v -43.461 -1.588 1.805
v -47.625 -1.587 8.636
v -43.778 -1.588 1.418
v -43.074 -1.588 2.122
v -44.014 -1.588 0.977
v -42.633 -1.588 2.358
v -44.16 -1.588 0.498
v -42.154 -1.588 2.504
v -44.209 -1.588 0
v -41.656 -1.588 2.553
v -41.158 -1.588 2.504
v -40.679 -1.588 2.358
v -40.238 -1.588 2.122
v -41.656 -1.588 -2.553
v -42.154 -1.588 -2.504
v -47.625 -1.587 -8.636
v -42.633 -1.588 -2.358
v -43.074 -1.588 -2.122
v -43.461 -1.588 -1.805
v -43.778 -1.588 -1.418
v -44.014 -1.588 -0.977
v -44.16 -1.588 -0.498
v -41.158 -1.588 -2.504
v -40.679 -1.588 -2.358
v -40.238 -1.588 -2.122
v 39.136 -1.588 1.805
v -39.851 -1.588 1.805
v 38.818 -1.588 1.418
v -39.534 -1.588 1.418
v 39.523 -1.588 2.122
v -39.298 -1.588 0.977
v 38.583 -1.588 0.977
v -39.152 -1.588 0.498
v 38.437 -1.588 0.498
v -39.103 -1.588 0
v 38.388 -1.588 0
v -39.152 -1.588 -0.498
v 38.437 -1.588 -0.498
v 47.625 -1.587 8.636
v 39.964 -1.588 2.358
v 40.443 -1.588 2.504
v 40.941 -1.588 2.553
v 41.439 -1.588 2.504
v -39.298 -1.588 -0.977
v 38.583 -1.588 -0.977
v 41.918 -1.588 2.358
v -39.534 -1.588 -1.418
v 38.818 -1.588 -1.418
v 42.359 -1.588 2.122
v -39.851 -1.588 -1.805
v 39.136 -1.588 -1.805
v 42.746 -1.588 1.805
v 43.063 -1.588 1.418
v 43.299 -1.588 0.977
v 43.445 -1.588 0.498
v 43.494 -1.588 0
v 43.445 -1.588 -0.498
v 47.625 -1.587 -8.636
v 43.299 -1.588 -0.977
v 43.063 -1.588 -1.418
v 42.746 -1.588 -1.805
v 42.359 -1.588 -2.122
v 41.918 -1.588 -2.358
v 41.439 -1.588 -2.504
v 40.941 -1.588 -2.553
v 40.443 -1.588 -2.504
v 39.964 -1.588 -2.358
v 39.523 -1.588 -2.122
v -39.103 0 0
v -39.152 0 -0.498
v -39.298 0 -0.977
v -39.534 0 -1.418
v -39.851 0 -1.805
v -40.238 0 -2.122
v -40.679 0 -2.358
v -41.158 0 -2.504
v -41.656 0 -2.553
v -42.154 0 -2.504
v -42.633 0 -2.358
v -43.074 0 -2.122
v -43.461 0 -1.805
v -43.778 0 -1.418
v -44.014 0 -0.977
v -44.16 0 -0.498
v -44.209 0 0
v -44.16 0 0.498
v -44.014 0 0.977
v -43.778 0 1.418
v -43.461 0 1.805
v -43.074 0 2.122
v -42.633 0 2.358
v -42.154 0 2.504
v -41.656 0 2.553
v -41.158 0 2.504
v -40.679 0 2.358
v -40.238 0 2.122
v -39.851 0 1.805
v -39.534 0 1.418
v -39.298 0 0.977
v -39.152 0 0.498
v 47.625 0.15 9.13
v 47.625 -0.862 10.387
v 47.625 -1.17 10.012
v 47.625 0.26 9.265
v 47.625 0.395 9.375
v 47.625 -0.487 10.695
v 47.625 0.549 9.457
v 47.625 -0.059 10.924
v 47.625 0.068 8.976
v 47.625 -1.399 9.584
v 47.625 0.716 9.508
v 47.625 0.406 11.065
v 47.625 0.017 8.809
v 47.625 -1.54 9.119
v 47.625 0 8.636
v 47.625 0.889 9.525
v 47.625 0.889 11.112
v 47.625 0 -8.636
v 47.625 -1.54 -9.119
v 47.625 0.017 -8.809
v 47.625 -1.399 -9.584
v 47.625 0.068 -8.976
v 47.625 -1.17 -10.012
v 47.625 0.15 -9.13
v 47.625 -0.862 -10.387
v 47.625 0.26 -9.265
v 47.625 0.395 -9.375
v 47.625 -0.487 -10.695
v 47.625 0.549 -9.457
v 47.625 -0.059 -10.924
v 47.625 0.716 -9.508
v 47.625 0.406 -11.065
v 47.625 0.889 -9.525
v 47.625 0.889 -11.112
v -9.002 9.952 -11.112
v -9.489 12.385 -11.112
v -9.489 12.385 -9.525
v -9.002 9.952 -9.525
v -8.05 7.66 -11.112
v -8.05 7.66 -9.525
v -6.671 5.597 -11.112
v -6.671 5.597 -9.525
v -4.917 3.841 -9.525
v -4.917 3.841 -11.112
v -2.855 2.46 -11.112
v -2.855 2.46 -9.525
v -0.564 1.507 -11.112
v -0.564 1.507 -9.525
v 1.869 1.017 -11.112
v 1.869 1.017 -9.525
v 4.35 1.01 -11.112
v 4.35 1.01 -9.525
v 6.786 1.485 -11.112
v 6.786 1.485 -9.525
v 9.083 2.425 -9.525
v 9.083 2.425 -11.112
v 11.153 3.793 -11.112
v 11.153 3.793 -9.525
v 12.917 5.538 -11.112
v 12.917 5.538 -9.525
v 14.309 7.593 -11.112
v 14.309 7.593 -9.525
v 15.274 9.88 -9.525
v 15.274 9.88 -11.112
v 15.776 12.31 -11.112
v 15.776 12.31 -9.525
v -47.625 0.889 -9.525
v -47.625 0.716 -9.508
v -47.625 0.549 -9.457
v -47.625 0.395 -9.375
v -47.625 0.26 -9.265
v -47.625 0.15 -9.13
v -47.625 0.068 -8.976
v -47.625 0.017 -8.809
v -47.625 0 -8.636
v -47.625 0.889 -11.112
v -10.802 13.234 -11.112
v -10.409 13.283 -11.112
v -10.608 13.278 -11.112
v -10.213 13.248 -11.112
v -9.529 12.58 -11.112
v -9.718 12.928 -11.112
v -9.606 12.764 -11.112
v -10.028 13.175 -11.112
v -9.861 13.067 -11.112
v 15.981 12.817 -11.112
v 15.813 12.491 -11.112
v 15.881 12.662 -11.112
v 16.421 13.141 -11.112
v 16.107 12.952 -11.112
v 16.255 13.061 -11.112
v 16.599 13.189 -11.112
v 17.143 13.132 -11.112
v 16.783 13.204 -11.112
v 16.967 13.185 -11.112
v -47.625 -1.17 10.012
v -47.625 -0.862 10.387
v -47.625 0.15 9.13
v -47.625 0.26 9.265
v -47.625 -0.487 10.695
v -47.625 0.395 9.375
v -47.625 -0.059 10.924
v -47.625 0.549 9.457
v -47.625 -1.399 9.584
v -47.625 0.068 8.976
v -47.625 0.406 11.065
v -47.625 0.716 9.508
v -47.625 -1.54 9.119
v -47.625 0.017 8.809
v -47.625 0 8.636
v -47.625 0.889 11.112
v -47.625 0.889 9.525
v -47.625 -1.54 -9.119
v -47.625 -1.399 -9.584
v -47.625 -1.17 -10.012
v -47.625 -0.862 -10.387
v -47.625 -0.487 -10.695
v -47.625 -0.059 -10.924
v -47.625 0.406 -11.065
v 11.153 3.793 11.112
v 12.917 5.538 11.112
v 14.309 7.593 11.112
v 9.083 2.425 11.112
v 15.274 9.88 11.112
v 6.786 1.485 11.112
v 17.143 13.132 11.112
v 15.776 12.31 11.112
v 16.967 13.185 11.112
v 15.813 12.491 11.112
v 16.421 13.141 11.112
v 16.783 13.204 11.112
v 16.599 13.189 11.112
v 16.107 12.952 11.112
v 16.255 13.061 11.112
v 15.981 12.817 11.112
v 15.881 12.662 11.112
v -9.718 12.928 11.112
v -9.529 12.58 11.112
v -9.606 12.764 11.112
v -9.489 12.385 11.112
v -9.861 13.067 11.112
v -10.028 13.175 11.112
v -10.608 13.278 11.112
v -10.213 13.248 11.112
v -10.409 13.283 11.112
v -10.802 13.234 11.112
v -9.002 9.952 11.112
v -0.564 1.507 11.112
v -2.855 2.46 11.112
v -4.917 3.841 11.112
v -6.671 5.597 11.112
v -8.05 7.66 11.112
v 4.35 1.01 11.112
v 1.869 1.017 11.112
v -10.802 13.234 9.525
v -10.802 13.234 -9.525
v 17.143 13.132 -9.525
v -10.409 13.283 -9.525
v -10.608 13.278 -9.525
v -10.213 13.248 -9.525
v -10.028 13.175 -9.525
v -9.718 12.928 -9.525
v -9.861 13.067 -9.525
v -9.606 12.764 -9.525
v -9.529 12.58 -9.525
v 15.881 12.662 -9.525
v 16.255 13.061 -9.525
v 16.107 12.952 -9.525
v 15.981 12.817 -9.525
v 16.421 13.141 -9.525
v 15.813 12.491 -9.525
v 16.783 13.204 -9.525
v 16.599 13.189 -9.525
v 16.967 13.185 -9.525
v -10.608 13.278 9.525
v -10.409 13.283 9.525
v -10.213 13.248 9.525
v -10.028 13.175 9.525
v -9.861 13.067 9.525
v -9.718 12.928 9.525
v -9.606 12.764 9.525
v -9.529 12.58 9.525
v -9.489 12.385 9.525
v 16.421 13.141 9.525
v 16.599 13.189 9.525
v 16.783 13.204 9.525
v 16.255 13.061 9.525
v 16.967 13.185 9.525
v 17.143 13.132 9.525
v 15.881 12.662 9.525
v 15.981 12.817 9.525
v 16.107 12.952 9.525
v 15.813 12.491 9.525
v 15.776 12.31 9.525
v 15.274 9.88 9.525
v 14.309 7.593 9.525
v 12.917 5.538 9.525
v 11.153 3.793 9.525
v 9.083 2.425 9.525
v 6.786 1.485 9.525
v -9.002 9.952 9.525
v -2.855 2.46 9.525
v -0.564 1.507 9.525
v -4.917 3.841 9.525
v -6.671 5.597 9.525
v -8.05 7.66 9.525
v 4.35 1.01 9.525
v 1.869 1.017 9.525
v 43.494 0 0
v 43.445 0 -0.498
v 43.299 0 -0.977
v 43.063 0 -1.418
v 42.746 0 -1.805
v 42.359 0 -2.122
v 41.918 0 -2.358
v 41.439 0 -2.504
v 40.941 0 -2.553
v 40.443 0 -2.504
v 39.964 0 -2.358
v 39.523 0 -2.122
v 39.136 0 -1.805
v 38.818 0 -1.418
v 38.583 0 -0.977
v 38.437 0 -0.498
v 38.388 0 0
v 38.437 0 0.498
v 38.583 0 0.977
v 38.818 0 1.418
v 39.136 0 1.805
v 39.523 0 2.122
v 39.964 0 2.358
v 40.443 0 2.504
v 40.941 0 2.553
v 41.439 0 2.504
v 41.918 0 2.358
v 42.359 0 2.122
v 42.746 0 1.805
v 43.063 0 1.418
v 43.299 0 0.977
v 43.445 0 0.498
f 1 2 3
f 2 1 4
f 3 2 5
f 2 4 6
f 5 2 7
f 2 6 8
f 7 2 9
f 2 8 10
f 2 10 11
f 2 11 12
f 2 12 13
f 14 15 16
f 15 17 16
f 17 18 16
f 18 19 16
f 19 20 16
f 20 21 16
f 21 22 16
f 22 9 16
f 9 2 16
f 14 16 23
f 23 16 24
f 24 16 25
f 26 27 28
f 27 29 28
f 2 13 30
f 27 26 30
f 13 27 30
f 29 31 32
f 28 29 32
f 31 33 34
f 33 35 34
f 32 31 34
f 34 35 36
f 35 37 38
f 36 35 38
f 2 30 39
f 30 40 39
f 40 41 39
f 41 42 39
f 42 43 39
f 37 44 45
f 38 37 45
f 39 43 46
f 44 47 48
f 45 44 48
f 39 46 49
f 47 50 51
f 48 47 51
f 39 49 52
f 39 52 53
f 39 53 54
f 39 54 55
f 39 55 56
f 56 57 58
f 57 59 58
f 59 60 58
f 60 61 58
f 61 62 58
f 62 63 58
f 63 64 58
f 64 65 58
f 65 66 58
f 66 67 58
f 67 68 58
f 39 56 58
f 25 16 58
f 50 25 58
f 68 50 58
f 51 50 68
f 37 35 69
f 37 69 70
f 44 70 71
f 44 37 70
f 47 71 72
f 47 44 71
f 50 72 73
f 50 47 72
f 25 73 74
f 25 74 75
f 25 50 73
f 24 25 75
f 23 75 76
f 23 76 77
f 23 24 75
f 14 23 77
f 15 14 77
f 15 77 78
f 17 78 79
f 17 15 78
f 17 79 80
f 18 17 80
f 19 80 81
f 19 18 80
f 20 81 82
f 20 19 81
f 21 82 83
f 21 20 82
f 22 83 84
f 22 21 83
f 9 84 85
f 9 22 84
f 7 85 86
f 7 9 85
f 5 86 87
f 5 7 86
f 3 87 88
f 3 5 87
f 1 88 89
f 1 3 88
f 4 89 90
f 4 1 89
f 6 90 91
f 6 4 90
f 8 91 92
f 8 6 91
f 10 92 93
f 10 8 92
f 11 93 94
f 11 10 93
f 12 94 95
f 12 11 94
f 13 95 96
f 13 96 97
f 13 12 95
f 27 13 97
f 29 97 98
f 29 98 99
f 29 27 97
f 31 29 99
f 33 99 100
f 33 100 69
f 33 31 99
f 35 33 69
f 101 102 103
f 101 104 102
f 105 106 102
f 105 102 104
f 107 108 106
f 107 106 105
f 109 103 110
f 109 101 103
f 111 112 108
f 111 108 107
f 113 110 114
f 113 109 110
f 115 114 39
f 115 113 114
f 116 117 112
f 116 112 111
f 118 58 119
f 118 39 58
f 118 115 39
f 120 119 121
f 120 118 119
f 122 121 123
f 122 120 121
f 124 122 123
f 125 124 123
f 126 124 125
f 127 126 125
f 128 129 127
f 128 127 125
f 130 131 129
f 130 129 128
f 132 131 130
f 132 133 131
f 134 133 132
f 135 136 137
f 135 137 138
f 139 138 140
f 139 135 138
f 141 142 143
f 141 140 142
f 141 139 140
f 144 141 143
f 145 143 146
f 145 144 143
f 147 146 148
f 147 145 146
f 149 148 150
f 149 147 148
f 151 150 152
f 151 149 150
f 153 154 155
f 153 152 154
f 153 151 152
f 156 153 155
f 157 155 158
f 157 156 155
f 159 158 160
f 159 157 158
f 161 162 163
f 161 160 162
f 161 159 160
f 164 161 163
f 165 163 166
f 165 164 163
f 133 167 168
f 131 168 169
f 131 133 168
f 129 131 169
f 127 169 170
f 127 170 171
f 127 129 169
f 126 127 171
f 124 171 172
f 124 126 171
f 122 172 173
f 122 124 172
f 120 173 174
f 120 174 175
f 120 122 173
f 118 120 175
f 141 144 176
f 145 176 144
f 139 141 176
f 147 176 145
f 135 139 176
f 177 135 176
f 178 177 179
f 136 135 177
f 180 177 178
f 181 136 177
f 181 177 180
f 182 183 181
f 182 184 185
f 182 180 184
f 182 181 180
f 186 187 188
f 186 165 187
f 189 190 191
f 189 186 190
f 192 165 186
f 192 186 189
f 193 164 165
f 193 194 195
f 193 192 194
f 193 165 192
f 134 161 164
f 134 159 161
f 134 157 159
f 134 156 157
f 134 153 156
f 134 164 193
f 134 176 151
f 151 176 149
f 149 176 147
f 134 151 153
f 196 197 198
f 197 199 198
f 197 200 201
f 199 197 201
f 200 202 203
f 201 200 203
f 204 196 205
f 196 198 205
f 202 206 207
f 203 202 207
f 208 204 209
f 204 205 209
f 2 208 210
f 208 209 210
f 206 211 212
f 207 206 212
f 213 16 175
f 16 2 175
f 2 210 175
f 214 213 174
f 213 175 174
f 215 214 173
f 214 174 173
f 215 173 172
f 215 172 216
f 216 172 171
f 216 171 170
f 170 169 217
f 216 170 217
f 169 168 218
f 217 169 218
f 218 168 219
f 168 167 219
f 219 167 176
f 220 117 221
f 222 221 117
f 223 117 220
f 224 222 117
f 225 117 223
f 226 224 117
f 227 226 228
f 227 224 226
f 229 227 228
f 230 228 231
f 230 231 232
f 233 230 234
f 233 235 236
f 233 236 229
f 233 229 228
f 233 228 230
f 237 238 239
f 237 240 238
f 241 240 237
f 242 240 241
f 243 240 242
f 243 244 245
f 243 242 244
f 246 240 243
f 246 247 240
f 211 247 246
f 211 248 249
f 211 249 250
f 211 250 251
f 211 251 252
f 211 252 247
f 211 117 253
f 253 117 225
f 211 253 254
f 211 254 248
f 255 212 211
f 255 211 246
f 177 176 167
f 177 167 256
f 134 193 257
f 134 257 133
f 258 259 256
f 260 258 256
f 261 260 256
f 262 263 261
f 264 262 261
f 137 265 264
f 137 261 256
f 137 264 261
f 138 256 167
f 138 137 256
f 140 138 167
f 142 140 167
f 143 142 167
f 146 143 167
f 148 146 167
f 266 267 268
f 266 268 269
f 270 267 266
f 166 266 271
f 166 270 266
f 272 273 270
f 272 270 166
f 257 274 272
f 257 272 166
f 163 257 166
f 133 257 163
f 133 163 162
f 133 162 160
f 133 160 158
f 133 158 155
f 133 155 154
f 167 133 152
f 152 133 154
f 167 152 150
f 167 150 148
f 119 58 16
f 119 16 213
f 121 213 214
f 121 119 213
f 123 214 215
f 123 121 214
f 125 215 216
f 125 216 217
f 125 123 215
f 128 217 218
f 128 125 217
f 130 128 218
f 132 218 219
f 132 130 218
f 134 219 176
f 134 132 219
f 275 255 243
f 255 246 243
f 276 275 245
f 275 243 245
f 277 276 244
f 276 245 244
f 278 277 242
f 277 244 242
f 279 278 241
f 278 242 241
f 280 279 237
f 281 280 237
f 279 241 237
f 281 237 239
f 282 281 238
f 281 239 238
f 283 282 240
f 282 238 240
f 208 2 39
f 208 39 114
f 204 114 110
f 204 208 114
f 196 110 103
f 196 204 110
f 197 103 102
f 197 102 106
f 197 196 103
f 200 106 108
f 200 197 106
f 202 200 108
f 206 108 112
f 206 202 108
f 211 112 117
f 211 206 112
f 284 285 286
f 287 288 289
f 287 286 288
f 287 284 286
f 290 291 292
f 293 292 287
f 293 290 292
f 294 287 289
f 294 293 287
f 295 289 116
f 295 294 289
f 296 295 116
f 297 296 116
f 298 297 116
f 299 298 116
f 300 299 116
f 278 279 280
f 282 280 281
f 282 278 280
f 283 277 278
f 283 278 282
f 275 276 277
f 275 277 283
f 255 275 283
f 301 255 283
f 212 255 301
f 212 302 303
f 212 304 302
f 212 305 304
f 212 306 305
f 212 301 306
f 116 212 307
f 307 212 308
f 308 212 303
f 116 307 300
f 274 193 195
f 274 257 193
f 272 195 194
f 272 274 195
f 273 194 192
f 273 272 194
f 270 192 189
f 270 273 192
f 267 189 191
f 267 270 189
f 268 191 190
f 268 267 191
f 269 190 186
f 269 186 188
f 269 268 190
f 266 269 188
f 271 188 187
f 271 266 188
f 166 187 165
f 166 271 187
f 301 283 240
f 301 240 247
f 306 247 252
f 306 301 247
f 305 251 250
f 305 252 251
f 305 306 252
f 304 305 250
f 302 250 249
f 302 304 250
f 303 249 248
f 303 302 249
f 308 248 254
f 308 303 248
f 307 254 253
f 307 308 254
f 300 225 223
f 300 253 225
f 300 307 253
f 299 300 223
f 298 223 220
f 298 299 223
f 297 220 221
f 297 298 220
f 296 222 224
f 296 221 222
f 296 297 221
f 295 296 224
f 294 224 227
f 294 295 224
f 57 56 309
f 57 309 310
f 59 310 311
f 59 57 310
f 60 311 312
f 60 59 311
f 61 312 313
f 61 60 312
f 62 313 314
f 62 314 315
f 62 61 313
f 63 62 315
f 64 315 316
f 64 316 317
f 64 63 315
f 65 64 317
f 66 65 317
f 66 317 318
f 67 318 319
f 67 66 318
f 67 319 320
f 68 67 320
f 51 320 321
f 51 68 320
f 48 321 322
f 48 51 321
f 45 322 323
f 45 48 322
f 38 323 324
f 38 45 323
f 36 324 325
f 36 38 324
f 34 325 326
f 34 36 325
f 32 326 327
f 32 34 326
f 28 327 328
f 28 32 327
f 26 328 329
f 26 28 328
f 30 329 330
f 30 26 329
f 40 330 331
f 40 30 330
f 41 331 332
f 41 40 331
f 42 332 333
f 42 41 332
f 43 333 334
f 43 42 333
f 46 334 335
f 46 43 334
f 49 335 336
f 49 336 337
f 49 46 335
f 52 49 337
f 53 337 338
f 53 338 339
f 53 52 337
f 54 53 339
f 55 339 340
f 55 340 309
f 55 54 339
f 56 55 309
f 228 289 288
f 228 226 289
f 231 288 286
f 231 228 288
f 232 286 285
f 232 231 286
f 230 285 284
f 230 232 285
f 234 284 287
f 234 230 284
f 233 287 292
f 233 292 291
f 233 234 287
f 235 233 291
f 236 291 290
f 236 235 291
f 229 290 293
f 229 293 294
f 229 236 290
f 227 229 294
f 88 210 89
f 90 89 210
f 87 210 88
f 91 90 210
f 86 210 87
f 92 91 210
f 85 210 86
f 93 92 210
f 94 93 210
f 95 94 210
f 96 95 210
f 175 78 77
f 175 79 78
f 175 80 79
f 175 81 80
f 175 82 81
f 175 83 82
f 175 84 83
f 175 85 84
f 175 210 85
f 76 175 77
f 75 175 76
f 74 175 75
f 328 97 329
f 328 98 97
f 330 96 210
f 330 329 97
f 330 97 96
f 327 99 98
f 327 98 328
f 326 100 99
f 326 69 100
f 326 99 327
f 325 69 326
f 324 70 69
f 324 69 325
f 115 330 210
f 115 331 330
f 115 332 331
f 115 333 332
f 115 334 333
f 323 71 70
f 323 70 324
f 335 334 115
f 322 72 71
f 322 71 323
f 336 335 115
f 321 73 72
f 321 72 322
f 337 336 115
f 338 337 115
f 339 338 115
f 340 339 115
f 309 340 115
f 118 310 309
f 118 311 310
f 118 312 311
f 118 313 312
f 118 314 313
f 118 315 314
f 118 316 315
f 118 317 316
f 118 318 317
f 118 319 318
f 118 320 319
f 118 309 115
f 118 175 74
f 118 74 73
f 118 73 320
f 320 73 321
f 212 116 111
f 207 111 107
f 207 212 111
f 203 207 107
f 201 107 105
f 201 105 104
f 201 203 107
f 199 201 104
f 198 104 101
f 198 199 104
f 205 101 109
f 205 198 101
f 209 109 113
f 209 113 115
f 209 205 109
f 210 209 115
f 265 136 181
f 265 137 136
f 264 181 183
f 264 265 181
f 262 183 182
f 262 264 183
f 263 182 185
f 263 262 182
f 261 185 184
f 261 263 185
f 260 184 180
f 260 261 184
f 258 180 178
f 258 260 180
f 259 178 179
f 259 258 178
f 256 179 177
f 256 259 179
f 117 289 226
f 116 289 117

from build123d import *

# Parameters (mm, degrees)
SKETCH1_W                      = 95.25
SKETCH1_H                      = 19.05
BASE_FLANGE1_DEPTH             = 1.5875
EDGE_FLANGE1_STRIP_W           = 8.128
EDGE_FLANGE1_STRIP_H           = 1.5875
EDGE_FLANGE1_STRIP_CUT_DEPTH   = 95.25
EDGE_FLANGE1_STRIP_2_W         = 8.128
EDGE_FLANGE1_STRIP_2_H         = 1.5875
EDGE_FLANGE1_STRIP_CUT_2_DEPTH = 95.25
EDGE_FLANGE1_DEPTH             = 95.25
EDGE_FLANGE1_BEND_DEPTH        = 95.25
CUT_EXTRUDE1_DEPTH             = 55.299926393
CUT_EXTRUDE1_DEPTH_BACK        = 55.299926393
HOLE1_START                    = -1.5875
HOLE1_OUTLINE_R                = 2.5527
HOLE1_DEPTH                    = 1.5875
FILLET1_R                      = 1


# Read off the part's stored shape, not the designer's step: Hole1
# Sheet-metal steps are written as plain solids
with BuildPart() as part:
    # Sketch1 → Base-Flange1 (new body)
    with BuildSketch(Plane(origin=(0, 0, 0), x_dir=(1, 0, 0), z_dir=(0, 1, 0))):
        Rectangle(SKETCH1_W, SKETCH1_H)
    extrude(amount=-BASE_FLANGE1_DEPTH)

    # Edge-Flange1 strip (across the edge) → Edge-Flange1 strip cut (cut)
    with BuildSketch(Plane(origin=(-47.625, 0, 9.525), x_dir=(0, 0, -1), z_dir=(1, 0, 0))):
        with Locations((-3.175, -0.79375)):
            Rectangle(EDGE_FLANGE1_STRIP_W, EDGE_FLANGE1_STRIP_H)
    extrude(amount=EDGE_FLANGE1_STRIP_CUT_DEPTH, mode=Mode.SUBTRACT)

    # Edge-Flange1 strip 2 (across the edge) → Edge-Flange1 strip cut 2 (cut)
    with BuildSketch(Plane(origin=(47.625, 0, -9.525), x_dir=(0, 0, 1), z_dir=(-1, 0, 0))):
        with Locations((-3.175, -0.79375)):
            Rectangle(EDGE_FLANGE1_STRIP_2_W, EDGE_FLANGE1_STRIP_2_H)
    extrude(amount=EDGE_FLANGE1_STRIP_CUT_2_DEPTH, mode=Mode.SUBTRACT)

    # Edge-Flange1 section (across the edge) → Edge-Flange1 (add)
    with BuildSketch(Plane(origin=(-47.625, 0, 9.525), x_dir=(0, 0, -1), z_dir=(1, 0, 0))):
        with BuildLine():
            Line((-1.5875, 0.889), (-1.5875, 13.6525))
            Line((-1.5875, 13.6525), (0, 13.6525))
            Line((0, 13.6525), (0, 0.889))
            ThreePointArc((0, 0.889), (0.260382072, 0.260382072), (0.889, 0))
            Line((0.889, 0), (0.889, -1.5875))
            ThreePointArc((0.889, -1.5875), (-0.862149944, -0.862149944), (-1.5875, 0.889))
        make_face()
    extrude(amount=EDGE_FLANGE1_DEPTH)

    # Edge-Flange1 section 2 (across the edge) → Edge-Flange1 bend (add)
    with BuildSketch(Plane(origin=(47.625, 0, -9.525), x_dir=(0, 0, 1), z_dir=(-1, 0, 0))):
        with BuildLine():
            Line((-1.5875, 0.889), (-1.5875, 13.6525))
            Line((-1.5875, 13.6525), (0, 13.6525))
            Line((0, 13.6525), (0, 0.889))
            ThreePointArc((0, 0.889), (0.260382072, 0.260382072), (0.889, 0))
            Line((0.889, 0), (0.889, -1.5875))
            ThreePointArc((0.889, -1.5875), (-0.862149944, -0.862149944), (-1.5875, 0.889))
        make_face()
    extrude(amount=EDGE_FLANGE1_BEND_DEPTH)

    # Sketch12 → Cut-Extrude1 (cut, two sides: drawn at the far end of the back side and taken through both)
    with BuildSketch(Plane.XY.offset(11.1125).offset(-CUT_EXTRUDE1_DEPTH_BACK)):
        with BuildLine():
            Line((15.847398271, 13.6525), (-9.552601729, 13.6525))
            ThreePointArc((-9.552601729, 13.6525), (3.147398271, 0.9525), (15.847398271, 13.6525))
        make_face()
        Polygon((-47.625, 0.889), (-9.552601729, 13.6525), (-47.625, 13.6525), align=None)
        Polygon((47.625, 13.6525), (15.847398271, 13.6525), (47.625, 0.889), align=None)
    extrude(amount=CUT_EXTRUDE1_DEPTH + CUT_EXTRUDE1_DEPTH_BACK, mode=Mode.SUBTRACT)

    # Hole1 outline → Hole1 (cut)
    with BuildSketch(Plane(origin=(0, 0, 0), x_dir=(1, 0, 0), z_dir=(0, 1, 0)).offset(HOLE1_START)):
        with Locations((40.940976195, 0)):
            Circle(HOLE1_OUTLINE_R)
        with Locations((-41.656, 0)):
            Circle(HOLE1_OUTLINE_R)
    extrude(amount=HOLE1_DEPTH, mode=Mode.SUBTRACT)

    # Fillet1
    fillet1_edges = [part.edges().sort_by_distance(p)[0] for p in [
        (-9.552601729, 13.6525, -10.31875),
        (15.847398271, 13.6525, 10.31875),
        (15.847398271, 13.6525, -10.31875),
        (-9.552601729, 13.6525, 10.31875),
    ]]
    fillet(fillet1_edges, radius=FILLET1_R)


solid = part.part
